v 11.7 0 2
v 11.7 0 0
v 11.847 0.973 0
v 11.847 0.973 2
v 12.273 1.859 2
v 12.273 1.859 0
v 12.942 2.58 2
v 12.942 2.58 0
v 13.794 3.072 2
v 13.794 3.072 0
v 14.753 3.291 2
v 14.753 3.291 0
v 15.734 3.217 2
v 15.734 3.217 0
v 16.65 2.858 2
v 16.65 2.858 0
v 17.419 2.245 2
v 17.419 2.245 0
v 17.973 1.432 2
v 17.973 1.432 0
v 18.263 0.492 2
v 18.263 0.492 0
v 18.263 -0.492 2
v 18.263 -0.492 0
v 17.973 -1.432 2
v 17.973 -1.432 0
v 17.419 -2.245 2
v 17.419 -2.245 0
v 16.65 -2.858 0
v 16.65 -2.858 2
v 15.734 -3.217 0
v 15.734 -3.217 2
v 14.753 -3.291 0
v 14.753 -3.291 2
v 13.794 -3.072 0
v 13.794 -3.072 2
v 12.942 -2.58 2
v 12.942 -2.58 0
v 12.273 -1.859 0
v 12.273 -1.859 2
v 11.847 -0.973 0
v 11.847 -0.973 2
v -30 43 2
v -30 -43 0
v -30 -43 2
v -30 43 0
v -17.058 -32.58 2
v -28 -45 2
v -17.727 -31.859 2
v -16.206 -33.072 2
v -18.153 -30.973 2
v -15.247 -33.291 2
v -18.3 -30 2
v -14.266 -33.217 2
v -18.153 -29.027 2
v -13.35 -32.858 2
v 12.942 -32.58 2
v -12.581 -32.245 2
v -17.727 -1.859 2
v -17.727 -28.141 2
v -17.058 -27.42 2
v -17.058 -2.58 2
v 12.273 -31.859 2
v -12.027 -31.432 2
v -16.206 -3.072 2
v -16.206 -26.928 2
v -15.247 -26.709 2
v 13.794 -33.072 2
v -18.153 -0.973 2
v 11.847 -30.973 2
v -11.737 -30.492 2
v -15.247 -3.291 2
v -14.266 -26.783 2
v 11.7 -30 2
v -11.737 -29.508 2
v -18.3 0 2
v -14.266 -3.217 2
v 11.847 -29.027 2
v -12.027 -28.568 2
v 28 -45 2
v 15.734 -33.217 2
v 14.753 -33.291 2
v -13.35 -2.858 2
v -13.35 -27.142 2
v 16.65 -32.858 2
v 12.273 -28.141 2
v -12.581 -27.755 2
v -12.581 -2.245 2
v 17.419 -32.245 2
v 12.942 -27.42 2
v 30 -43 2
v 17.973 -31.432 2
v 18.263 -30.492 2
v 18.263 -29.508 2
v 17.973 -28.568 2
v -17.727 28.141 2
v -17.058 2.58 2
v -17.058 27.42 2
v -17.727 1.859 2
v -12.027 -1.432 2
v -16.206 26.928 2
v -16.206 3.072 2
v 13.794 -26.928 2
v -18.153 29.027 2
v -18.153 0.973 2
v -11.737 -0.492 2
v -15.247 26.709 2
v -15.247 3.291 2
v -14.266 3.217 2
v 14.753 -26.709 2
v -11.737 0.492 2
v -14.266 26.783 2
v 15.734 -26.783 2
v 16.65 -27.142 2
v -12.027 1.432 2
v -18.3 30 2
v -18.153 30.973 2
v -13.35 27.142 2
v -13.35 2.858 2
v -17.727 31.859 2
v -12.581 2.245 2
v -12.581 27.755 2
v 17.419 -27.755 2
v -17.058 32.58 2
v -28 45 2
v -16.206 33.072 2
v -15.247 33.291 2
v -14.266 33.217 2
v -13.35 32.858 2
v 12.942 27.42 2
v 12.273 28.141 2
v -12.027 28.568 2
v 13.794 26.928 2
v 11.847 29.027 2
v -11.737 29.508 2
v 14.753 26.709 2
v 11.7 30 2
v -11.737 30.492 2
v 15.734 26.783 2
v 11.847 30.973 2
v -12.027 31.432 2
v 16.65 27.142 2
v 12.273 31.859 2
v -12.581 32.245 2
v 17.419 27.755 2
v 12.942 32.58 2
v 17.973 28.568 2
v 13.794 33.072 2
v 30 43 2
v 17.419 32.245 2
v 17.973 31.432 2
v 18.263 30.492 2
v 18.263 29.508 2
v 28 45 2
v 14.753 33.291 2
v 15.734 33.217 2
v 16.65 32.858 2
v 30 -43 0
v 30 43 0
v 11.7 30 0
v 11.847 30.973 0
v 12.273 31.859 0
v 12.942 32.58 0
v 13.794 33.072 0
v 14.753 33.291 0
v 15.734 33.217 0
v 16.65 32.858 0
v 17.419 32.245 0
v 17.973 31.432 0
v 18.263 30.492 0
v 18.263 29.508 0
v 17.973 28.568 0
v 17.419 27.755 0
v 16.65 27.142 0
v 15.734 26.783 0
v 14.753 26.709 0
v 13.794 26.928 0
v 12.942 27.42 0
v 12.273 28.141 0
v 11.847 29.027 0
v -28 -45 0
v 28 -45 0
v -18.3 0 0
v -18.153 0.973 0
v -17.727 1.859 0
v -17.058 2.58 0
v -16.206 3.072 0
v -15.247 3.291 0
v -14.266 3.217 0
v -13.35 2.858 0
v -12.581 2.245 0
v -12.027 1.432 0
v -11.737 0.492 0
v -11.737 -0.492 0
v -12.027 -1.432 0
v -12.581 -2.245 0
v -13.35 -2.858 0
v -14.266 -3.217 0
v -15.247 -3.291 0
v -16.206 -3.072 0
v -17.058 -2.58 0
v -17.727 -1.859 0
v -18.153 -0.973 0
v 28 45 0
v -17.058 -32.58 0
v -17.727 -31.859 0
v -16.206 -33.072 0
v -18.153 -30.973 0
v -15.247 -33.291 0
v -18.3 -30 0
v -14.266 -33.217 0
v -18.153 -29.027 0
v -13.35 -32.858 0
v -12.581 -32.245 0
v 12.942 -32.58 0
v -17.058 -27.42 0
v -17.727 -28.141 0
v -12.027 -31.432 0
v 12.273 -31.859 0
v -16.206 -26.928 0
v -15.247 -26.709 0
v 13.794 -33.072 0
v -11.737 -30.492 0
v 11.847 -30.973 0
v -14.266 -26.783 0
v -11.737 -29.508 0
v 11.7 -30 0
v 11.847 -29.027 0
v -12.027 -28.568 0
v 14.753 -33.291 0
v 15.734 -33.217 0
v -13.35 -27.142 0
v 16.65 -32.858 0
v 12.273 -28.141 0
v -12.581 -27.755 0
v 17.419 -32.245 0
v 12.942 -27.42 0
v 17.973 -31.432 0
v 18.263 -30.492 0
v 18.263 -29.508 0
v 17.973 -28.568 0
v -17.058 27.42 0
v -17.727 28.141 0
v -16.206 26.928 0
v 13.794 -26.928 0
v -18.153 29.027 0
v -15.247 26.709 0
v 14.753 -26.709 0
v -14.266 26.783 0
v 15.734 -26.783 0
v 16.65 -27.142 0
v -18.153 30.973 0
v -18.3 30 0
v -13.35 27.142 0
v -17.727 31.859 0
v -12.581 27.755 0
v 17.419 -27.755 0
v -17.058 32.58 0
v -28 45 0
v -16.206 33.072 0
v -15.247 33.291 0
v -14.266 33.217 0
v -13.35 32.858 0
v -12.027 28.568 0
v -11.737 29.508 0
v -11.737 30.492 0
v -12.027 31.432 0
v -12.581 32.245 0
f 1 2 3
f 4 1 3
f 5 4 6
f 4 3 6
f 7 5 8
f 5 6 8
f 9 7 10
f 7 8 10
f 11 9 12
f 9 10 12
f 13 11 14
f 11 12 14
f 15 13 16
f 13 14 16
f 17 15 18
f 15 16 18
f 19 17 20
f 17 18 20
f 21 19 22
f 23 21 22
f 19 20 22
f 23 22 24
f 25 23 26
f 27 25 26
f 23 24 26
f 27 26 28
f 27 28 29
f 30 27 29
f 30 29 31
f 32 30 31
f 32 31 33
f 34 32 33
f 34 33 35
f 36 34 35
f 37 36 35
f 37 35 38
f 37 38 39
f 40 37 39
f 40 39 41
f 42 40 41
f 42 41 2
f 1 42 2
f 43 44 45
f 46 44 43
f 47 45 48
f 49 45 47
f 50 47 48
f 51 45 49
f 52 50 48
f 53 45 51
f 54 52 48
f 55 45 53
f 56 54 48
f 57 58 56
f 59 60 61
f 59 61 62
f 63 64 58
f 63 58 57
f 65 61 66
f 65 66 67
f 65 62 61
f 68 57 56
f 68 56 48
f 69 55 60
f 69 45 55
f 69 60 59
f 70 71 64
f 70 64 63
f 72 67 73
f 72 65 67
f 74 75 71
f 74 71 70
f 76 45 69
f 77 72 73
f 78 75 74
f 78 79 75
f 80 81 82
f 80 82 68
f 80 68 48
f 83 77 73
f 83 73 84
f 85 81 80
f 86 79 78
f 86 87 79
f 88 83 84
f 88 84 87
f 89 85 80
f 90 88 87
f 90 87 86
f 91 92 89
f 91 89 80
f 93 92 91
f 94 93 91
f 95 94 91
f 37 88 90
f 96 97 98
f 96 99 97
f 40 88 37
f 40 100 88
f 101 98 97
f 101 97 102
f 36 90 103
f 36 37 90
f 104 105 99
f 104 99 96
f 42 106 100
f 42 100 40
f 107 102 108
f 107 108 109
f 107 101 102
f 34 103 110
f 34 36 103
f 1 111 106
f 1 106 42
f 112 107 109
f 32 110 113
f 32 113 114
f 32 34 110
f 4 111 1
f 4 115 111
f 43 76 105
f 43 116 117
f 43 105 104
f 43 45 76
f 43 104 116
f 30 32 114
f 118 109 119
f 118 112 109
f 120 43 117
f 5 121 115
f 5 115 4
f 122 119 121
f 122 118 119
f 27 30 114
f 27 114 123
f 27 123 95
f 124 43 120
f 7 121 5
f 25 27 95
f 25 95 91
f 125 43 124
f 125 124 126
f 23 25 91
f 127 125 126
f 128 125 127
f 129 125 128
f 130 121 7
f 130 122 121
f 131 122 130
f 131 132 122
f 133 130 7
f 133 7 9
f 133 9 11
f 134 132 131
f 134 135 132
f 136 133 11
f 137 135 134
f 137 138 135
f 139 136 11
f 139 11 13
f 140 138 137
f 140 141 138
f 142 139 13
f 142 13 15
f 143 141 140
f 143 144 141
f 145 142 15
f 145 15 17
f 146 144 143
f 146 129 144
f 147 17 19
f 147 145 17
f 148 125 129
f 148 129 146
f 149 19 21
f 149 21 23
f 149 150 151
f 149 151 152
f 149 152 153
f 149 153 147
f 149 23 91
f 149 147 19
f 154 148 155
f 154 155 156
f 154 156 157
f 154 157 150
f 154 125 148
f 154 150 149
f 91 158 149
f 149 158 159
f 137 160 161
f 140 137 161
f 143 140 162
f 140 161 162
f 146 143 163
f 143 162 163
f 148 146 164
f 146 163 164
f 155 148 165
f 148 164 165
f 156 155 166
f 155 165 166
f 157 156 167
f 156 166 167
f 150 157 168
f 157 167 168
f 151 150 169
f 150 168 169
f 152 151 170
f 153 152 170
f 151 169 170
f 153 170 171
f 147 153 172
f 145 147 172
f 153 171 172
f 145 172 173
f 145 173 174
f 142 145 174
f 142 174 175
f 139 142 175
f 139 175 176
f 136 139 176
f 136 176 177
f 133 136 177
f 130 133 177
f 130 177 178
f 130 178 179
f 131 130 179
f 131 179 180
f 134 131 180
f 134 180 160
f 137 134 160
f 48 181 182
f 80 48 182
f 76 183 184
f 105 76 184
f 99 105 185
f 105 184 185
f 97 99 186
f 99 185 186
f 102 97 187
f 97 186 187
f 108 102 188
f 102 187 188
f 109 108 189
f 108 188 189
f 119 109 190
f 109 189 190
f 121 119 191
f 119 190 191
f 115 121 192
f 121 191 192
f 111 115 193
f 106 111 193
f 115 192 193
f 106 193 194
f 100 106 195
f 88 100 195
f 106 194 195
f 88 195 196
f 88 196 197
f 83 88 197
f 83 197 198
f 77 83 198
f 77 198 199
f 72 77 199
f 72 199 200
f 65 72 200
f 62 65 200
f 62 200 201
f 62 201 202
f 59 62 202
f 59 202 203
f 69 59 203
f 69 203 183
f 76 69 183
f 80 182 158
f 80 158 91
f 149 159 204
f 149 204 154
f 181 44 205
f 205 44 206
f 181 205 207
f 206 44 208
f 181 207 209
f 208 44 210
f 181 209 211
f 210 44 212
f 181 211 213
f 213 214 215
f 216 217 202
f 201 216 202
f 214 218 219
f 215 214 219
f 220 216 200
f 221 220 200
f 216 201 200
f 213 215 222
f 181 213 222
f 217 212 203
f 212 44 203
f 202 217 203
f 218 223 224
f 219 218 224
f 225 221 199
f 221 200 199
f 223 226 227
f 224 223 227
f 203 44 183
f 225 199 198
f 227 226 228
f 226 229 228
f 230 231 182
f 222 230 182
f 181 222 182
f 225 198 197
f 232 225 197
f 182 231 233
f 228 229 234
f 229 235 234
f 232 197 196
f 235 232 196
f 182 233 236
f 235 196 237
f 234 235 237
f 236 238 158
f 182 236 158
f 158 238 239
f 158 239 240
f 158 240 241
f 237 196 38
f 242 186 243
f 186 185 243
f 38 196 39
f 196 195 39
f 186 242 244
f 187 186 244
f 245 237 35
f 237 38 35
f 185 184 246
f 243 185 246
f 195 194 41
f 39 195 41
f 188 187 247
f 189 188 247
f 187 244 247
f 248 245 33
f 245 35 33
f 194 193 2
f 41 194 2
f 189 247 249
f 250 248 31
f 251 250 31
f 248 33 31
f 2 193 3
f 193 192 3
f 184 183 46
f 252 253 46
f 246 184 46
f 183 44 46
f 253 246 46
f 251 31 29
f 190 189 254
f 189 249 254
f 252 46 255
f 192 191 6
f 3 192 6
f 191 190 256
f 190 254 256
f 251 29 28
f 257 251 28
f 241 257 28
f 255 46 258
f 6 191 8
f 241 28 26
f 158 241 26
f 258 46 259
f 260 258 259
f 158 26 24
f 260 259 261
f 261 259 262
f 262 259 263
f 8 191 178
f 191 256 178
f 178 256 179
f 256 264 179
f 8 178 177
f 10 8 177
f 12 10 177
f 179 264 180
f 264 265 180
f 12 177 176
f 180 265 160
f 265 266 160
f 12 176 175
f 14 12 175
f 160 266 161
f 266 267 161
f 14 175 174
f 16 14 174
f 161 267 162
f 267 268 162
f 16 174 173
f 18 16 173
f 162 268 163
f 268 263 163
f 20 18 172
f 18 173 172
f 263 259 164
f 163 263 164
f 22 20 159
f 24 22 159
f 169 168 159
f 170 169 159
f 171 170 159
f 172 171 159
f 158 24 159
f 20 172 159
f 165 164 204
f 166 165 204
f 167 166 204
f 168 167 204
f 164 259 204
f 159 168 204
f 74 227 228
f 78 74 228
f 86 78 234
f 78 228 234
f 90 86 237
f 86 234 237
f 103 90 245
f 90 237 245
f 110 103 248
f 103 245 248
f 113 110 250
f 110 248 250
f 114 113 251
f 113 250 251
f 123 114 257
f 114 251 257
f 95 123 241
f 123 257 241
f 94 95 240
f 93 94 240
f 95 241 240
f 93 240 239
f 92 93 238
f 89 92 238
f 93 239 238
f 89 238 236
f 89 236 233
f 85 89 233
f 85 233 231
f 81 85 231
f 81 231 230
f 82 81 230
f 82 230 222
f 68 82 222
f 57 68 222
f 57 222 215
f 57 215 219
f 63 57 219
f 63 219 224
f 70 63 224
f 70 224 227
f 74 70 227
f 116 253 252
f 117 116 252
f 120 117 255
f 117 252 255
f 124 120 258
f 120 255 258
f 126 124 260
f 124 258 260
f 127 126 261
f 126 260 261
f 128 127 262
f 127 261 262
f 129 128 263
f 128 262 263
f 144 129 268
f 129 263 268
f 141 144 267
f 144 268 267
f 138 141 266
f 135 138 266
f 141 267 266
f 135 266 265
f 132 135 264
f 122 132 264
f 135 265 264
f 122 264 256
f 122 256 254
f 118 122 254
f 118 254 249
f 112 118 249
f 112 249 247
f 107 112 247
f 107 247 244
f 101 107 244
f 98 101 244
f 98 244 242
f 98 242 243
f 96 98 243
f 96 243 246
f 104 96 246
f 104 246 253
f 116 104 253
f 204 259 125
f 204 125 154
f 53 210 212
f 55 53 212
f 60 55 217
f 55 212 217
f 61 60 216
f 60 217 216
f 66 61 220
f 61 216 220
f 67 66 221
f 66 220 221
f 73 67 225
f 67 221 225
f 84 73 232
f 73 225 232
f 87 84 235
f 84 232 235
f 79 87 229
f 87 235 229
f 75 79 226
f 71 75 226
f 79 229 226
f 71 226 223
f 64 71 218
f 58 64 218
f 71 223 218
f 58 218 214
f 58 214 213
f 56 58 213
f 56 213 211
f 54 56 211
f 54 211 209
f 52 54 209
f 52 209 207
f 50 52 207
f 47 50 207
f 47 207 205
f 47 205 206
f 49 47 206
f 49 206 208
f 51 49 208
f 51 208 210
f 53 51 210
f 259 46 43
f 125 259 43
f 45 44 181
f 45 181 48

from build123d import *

# Parameters (mm, degrees)
SKETCH_1_W        = 60
SKETCH_1_H        = 90
EXTRUDE_1_DEPTH   = 2
CHAMFER_1_SIZE    = 2
HOLE_WIZARD_M61_D = 6.6


with BuildPart() as part:
    # Эскиз1 → Бобышка-Вытянуть1 (new body)
    with BuildSketch(Plane.XY):
        Rectangle(SKETCH_1_W, SKETCH_1_H)
    extrude(amount=EXTRUDE_1_DEPTH)

    # Фаска1
    chamfer_1_edges = [part.edges().sort_by_distance(p)[0] for p in [
        (30, -45, 1),
        (-30, -45, 1),
        (-30, 45, 1),
        (30, 45, 1),
    ]]
    chamfer(chamfer_1_edges, length=CHAMFER_1_SIZE)

    # Отверстие с зазором M61 (through all)
    with Locations(Plane.XY.offset(2)):
        with Locations((-15, 30), (15, 30), (15, 0), (-15, 0), (-15, -30), (15, -30)):
            Hole(HOLE_WIZARD_M61_D / 2)


solid = part.part
